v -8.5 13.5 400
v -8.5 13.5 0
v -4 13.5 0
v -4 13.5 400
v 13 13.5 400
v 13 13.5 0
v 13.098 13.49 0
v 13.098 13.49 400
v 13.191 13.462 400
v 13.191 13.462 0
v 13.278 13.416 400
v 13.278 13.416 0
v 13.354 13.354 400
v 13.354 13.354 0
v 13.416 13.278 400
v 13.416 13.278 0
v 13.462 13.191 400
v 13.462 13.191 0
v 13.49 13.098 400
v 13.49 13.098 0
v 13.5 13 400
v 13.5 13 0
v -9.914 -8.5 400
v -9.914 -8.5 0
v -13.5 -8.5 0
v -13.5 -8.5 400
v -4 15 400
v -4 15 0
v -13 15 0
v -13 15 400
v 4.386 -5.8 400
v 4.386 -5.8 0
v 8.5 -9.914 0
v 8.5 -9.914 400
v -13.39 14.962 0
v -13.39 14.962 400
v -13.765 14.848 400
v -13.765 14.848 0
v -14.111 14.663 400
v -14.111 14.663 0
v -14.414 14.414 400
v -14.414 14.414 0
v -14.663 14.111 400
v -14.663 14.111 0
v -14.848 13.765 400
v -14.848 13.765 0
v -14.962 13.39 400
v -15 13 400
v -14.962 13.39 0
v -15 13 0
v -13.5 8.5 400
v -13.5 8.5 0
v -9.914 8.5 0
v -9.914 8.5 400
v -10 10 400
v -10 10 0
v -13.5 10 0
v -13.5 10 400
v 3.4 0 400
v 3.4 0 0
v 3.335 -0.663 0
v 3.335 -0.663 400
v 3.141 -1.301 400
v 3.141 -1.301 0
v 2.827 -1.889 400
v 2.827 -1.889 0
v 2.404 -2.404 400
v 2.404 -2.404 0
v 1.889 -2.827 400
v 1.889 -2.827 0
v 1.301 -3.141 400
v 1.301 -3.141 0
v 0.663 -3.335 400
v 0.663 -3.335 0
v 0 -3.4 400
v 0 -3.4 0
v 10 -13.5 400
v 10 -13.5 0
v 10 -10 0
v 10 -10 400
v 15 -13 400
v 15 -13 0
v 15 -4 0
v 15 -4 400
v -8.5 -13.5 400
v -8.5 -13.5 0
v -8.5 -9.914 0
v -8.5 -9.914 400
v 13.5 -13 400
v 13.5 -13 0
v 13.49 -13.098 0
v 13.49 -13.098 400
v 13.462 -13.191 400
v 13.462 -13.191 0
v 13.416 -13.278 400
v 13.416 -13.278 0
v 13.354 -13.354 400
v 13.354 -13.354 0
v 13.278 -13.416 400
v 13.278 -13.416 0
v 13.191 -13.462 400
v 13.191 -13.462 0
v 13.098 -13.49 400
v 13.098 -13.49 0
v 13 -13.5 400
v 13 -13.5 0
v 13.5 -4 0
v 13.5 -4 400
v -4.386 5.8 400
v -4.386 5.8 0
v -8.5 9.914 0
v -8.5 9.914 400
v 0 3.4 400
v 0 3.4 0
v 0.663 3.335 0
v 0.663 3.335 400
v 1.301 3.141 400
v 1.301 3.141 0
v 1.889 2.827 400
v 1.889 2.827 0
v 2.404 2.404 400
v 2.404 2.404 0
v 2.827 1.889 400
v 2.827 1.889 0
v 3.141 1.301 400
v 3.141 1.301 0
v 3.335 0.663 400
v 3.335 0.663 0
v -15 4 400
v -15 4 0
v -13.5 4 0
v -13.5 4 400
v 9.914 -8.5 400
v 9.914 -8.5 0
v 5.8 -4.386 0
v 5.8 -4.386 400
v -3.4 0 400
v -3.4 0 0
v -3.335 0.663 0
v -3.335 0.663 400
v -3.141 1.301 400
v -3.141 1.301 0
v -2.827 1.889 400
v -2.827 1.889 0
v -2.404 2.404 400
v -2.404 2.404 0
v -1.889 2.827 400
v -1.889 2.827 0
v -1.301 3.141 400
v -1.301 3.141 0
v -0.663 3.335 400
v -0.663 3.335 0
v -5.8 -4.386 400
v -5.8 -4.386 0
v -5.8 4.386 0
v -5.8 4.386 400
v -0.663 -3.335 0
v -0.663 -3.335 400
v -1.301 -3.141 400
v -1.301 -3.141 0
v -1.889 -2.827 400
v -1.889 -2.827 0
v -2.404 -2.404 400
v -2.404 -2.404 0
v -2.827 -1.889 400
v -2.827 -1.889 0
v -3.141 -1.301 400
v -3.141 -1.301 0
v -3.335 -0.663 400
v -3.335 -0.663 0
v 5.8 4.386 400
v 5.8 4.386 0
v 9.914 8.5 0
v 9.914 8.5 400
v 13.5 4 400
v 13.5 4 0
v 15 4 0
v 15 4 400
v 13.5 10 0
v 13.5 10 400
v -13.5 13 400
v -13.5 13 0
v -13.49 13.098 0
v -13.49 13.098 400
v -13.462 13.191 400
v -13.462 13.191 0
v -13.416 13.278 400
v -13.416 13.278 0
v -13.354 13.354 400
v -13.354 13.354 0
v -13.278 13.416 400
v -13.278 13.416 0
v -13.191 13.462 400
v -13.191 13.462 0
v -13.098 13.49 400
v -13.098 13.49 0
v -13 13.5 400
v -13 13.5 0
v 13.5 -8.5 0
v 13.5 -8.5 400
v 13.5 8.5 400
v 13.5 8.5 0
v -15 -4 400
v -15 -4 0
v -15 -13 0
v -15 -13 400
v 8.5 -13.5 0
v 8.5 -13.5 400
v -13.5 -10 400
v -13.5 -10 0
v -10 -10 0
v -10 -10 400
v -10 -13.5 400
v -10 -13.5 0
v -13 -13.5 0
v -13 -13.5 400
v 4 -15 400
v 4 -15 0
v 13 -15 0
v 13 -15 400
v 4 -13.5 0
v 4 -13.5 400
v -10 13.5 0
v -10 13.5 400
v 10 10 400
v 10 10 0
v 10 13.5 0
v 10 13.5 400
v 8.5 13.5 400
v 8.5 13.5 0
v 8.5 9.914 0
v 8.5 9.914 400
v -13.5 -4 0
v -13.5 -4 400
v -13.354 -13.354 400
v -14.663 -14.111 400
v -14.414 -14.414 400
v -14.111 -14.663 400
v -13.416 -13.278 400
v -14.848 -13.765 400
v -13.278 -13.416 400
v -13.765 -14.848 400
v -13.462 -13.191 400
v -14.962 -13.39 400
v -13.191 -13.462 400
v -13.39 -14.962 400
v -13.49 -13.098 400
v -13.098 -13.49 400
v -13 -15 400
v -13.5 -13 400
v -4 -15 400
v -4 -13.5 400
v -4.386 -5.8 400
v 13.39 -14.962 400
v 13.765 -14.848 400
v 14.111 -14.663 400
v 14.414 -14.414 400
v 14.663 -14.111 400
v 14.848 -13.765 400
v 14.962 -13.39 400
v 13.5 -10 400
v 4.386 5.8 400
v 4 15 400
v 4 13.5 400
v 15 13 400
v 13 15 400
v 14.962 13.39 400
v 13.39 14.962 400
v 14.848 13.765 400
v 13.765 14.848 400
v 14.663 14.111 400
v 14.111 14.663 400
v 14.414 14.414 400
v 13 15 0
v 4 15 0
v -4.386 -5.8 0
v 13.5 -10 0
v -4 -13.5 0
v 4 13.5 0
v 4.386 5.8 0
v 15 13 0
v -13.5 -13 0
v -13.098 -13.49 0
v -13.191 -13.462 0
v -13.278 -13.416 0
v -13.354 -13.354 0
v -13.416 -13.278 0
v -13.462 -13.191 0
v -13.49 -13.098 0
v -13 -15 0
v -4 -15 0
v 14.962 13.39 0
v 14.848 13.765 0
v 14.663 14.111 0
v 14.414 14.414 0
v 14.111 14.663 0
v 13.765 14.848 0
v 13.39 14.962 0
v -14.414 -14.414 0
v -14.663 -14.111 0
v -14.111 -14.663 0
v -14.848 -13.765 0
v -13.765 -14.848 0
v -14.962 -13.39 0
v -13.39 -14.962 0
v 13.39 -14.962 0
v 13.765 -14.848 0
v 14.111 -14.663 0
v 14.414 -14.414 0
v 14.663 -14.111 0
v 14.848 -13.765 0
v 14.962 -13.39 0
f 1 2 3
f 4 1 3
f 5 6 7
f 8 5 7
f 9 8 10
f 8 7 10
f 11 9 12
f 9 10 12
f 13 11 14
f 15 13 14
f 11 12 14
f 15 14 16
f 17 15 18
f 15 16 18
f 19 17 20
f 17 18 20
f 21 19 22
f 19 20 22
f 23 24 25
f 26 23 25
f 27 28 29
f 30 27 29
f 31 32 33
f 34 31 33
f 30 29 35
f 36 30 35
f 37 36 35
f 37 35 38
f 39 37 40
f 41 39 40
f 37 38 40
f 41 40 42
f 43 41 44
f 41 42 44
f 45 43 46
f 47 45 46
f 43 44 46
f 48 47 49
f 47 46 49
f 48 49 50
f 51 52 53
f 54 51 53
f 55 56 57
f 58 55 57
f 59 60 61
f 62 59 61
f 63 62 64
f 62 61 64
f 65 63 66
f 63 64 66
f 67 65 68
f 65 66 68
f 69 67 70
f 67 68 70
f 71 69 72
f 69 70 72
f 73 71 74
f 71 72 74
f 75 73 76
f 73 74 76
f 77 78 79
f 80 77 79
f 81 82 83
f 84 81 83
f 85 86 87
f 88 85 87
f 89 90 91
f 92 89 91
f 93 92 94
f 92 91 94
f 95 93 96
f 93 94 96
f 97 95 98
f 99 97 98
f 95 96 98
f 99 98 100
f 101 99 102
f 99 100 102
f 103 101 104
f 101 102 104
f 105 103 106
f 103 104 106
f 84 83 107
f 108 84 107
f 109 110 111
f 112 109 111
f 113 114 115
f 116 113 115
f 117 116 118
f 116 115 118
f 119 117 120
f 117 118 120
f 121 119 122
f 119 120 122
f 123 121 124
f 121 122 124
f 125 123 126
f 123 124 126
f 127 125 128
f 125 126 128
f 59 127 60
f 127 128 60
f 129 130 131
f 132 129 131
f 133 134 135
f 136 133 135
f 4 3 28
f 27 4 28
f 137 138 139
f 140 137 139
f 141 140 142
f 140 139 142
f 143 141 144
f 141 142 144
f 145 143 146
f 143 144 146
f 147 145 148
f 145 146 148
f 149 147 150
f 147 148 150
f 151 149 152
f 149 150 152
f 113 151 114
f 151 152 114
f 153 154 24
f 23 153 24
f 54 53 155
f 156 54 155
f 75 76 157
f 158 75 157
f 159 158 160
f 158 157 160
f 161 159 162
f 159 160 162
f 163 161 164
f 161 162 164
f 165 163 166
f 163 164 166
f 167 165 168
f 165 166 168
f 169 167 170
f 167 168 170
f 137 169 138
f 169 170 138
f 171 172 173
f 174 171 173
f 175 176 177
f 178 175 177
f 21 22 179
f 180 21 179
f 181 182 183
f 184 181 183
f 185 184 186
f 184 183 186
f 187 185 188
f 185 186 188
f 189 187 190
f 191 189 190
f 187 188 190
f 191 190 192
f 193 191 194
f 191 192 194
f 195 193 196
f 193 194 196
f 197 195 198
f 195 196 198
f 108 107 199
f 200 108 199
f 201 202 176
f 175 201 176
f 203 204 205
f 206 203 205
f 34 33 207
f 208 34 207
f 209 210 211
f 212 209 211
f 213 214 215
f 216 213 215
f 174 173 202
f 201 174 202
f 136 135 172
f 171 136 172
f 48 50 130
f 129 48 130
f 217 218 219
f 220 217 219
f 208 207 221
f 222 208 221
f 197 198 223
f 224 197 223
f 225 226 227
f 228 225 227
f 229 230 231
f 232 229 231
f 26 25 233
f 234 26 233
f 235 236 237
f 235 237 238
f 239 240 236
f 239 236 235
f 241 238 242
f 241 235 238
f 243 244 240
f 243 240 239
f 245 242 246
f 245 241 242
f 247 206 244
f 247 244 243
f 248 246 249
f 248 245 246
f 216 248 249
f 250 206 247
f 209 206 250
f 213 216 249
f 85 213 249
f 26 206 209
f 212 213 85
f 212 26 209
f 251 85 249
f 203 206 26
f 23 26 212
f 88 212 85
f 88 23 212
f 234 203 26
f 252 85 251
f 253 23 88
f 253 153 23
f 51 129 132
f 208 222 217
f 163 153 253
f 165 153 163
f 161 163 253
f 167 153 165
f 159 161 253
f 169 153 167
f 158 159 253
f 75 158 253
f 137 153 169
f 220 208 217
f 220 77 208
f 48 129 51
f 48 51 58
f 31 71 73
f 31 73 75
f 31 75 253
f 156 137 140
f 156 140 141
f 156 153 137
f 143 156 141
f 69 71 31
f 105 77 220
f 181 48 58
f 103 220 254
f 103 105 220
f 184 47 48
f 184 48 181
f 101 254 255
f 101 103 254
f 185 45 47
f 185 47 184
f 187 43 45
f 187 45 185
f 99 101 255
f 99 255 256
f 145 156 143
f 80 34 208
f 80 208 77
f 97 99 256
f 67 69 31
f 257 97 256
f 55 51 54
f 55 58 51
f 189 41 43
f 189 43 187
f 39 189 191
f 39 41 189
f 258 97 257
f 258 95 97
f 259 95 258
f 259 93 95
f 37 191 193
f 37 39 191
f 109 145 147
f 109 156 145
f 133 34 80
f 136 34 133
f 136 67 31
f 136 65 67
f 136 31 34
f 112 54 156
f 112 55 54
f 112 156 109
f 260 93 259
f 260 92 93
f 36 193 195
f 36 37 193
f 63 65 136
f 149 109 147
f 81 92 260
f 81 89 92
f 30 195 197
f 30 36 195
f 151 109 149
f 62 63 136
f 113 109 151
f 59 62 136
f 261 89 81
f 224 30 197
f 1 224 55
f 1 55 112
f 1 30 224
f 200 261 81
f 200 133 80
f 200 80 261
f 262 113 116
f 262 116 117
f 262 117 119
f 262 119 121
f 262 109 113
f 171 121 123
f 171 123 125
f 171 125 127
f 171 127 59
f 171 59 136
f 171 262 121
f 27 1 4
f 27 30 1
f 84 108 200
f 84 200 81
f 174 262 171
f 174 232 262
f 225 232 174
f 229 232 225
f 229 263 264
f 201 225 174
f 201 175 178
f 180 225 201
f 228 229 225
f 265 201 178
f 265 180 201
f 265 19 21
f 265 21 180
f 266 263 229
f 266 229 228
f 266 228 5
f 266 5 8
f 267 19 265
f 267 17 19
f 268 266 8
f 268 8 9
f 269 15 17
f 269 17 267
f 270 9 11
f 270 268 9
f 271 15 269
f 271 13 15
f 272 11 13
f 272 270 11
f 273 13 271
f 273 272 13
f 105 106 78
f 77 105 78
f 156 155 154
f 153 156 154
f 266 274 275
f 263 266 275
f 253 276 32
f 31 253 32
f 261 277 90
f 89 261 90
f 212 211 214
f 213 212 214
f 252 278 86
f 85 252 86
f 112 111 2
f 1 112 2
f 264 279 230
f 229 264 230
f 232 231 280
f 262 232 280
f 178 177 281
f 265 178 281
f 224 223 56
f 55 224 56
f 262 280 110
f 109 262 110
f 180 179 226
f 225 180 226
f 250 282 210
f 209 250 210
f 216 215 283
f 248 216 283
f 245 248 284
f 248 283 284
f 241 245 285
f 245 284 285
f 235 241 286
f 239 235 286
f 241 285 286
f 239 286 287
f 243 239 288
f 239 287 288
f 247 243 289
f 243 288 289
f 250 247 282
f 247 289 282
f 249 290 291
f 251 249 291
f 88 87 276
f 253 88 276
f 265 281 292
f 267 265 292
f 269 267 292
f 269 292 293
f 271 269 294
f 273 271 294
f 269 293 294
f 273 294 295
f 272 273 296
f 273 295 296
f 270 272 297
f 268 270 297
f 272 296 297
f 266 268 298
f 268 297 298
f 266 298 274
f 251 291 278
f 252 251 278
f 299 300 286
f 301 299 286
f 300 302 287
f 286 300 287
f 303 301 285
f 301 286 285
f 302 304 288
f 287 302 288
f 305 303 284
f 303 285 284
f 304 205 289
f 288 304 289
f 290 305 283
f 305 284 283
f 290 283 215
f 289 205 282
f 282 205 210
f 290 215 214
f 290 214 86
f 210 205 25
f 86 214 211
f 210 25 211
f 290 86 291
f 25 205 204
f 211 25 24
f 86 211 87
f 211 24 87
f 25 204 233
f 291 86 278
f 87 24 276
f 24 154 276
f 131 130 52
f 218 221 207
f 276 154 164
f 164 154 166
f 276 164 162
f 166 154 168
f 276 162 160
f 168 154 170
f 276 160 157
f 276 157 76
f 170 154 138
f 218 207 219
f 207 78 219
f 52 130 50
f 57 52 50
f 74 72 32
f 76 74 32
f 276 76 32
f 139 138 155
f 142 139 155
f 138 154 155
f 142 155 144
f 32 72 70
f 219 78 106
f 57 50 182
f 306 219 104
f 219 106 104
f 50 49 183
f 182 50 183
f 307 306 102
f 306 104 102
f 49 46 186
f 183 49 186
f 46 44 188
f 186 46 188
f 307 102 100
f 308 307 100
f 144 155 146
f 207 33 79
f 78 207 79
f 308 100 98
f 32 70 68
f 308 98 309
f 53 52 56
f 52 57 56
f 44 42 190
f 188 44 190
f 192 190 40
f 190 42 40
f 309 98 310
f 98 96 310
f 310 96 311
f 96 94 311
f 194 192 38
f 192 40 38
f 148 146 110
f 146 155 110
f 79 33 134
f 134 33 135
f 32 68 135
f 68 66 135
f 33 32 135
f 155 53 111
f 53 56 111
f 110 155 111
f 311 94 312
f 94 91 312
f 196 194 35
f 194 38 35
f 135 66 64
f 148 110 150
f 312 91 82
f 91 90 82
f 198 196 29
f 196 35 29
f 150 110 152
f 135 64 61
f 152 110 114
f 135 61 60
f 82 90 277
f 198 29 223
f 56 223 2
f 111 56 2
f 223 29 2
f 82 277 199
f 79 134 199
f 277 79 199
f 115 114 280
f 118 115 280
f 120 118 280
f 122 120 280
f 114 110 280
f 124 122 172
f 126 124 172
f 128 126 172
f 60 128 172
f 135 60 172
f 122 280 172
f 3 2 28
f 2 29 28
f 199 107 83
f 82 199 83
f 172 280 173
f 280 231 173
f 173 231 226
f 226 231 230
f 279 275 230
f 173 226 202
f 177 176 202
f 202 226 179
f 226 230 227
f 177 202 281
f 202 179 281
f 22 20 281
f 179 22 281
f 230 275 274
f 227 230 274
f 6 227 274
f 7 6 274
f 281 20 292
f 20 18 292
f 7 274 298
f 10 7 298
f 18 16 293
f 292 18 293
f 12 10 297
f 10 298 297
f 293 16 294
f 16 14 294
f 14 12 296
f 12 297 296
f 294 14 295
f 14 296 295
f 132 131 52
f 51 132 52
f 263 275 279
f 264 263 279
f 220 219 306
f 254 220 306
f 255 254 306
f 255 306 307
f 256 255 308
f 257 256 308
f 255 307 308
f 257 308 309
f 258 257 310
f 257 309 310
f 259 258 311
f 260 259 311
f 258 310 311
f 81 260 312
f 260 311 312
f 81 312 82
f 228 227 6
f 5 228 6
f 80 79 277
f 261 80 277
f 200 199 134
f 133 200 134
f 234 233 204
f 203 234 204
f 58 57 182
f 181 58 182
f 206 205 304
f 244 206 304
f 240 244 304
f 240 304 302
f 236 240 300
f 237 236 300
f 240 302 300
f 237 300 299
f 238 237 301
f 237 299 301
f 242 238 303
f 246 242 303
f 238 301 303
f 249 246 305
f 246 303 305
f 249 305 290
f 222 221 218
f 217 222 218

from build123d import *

# Parameters (mm, degrees)
DODANIE_WYCI_GNI_CIE1_DEPTH = 400


with BuildPart() as part:
    # Szkic1 → Dodanie-wyciągnięcie1 (new body)
    with BuildSketch(Plane.XY):
        with BuildLine():
            Line((4.385786438, 5.8), (0, 5.8))
            Line((0, 5.8), (-4.385786438, 5.8))
            Line((-4.385786438, 5.8), (-8.5, 9.914213562))
            Line((-8.5, 9.914213562), (-8.5, 13.5))
            Line((-8.5, 13.5), (-4, 13.5))
            Line((-4, 13.5), (-4, 15))
            Line((-4, 15), (-13, 15))
            ThreePointArc((-13, 15), (-14.414213562, 14.414213562), (-15, 13))
            Line((-15, 13), (-15, 4))
            Line((-15, 4), (-13.5, 4))
            Line((-13.5, 4), (-13.5, 8.5))
            Line((-13.5, 8.5), (-9.914213562, 8.5))
            Line((-9.914213562, 8.5), (-5.8, 4.385786438))
            Line((-5.8, 4.385786438), (-5.8, 0))
            Line((-5.8, 0), (-5.8, -4.385786438))
            Line((-5.8, -4.385786438), (-9.914213562, -8.5))
            Line((-9.914213562, -8.5), (-13.5, -8.5))
            Line((-13.5, -8.5), (-13.5, -4))
            Line((-13.5, -4), (-15, -4))
            Line((-15, -4), (-15, -13))
            ThreePointArc((-15, -13), (-14.414213562, -14.414213562), (-13, -15))
            Line((-13, -15), (-4, -15))
            Line((-4, -15), (-4, -13.5))
            Line((-4, -13.5), (-8.5, -13.5))
            Line((-8.5, -13.5), (-8.5, -9.914213562))
            Line((-8.5, -9.914213562), (-4.385786438, -5.8))
            Line((-4.385786438, -5.8), (0, -5.8))
            Line((0, -5.8), (4.385786438, -5.8))
            Line((4.385786438, -5.8), (8.5, -9.914213562))
            Line((8.5, -9.914213562), (8.5, -13.5))
            Line((8.5, -13.5), (4, -13.5))
            Line((4, -13.5), (4, -15))
            Line((4, -15), (13, -15))
            ThreePointArc((13, -15), (14.414213562, -14.414213562), (15, -13))
            Line((15, -13), (15, -4))
            Line((15, -4), (13.5, -4))
            Line((13.5, -4), (13.5, -8.5))
            Line((13.5, -8.5), (9.914213562, -8.5))
            Line((9.914213562, -8.5), (5.8, -4.385786438))
            Line((5.8, -4.385786438), (5.8, 0))
            Line((5.8, 0), (5.8, 4.385786438))
            Line((5.8, 4.385786438), (9.914213562, 8.5))
            Line((9.914213562, 8.5), (13.5, 8.5))
            Line((13.5, 8.5), (13.5, 4))
            Line((13.5, 4), (15, 4))
            Line((15, 4), (15, 13))
            ThreePointArc((15, 13), (14.414213562, 14.414213562), (13, 15))
            Line((13, 15), (4, 15))
            Line((4, 15), (4, 13.5))
            Line((4, 13.5), (8.5, 13.5))
            Line((8.5, 13.5), (8.5, 9.914213562))
            Line((8.5, 9.914213562), (4.385786438, 5.8))
        make_face()
        with BuildLine():
            Line((-13.5, -10), (-10, -10))
            Line((-10, -10), (-10, -13.5))
            Line((-10, -13.5), (-13, -13.5))
            ThreePointArc((-13, -13.5), (-13.353553391, -13.353553391), (-13.5, -13))
            Line((-13.5, -13), (-13.5, -10))
        make_face(mode=Mode.SUBTRACT)
        with BuildLine():
            Line((10, -13.5), (10, -10))
            Line((10, -10), (13.5, -10))
            Line((13.5, -10), (13.5, -13))
            ThreePointArc((13.5, -13), (13.353553391, -13.353553391), (13, -13.5))
            Line((13, -13.5), (10, -13.5))
        make_face(mode=Mode.SUBTRACT)
        with BuildLine():
            ThreePointArc((3.4, 0), (2.404163056, -2.404163056), (0, -3.4))
            ThreePointArc((0, -3.4), (-2.404163056, -2.404163056), (-3.4, 0))
            ThreePointArc((-3.4, 0), (-2.404163056, 2.404163056), (0, 3.4))
            ThreePointArc((0, 3.4), (2.404163056, 2.404163056), (3.4, 0))
        make_face(mode=Mode.SUBTRACT)
        with BuildLine():
            Line((-10, 13.5), (-10, 10))
            Line((-10, 10), (-13.5, 10))
            Line((-13.5, 10), (-13.5, 13))
            ThreePointArc((-13.5, 13), (-13.353553391, 13.353553391), (-13, 13.5))
            Line((-13, 13.5), (-10, 13.5))
        make_face(mode=Mode.SUBTRACT)
        with BuildLine():
            Line((10, 10), (10, 13.5))
            Line((10, 13.5), (13, 13.5))
            ThreePointArc((13, 13.5), (13.353553391, 13.353553391), (13.5, 13))
            Line((13.5, 13), (13.5, 10))
            Line((13.5, 10), (10, 10))
        make_face(mode=Mode.SUBTRACT)
    extrude(amount=DODANIE_WYCI_GNI_CIE1_DEPTH)


solid = part.part
